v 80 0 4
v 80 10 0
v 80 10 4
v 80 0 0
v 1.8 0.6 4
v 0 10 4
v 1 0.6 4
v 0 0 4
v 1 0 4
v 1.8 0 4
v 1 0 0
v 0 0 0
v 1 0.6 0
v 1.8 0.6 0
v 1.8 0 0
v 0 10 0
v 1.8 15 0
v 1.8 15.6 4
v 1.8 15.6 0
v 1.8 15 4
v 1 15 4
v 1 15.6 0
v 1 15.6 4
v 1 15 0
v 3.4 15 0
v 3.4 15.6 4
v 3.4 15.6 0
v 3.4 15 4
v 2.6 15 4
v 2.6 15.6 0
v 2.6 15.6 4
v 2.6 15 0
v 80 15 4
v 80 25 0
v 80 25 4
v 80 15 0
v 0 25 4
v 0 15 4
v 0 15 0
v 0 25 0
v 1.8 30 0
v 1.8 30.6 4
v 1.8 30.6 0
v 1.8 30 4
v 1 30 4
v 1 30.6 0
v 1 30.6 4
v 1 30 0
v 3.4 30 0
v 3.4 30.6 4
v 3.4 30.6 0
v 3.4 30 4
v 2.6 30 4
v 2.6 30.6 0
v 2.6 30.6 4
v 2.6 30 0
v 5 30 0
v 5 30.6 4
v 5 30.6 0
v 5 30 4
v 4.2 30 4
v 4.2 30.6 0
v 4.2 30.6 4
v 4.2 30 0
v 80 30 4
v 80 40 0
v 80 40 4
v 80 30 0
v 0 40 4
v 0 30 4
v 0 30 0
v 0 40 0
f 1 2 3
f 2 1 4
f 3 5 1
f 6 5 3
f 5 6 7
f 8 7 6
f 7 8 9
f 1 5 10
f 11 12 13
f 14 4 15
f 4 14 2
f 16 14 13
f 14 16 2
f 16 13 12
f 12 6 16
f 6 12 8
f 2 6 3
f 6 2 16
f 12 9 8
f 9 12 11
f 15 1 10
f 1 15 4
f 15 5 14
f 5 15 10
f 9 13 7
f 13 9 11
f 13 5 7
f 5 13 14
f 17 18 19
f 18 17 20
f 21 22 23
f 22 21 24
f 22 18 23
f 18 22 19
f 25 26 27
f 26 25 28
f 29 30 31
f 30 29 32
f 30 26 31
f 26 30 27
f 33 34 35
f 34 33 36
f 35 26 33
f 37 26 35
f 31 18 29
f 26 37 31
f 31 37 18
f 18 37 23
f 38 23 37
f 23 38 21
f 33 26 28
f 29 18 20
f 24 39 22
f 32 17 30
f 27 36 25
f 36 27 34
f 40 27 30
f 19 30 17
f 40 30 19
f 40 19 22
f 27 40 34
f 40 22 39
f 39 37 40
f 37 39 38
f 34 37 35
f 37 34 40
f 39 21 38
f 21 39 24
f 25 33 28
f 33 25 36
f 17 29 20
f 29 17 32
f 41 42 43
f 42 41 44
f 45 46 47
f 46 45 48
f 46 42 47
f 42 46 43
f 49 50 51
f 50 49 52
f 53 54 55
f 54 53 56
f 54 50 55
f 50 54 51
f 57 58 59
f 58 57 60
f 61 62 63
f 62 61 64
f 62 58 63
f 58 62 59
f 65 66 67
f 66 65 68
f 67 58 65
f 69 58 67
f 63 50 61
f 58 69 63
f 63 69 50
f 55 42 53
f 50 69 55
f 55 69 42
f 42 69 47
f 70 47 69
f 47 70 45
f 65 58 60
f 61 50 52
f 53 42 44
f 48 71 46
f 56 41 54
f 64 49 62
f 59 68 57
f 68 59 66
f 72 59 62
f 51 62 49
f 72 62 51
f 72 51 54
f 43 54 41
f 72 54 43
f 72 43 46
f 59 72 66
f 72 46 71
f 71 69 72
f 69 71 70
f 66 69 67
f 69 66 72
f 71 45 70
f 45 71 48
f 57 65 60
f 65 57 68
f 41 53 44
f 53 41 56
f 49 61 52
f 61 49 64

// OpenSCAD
// Test bars for a simple break test: print them with the material and settings you
// want to compare, then bend each one to failure. Unprinted and untested design.
// The bars follow the 80 x 10 x 4 mm shape of the ISO 178 bending test, but this
// is a home comparison, not a standard test.

/* [Bars] */
// Bar length (mm)
length = 80; // [40:5:120]
// Bar width (mm)
width = 10; // [5:1:20]
// Bar thickness (mm)
thickness = 4; // [2:0.5:8]
// Number of bars
count = 3; // [1:1:5]
// Gap between bars on the plate (mm)
gap = 5; // [2:1:15]

/* [Hidden] */
mark_w = 0.8; // side grooves that number the bars: one for the first, two for the second...
mark_d = 0.6;
mark_pitch = 1.6;

module bar(index) {
    difference() {
        cube([length, width, thickness]);
        // Shallow grooves on one side face near the end, outside a centred test span.
        for (k = [0 : index])
            translate([1 + k * mark_pitch, -0.01, -0.01])
                cube([mark_w, mark_d + 0.01, thickness + 0.02]);
    }
}

for (i = [0 : count - 1])
    translate([0, i * (width + gap), 0])
        bar(i);
